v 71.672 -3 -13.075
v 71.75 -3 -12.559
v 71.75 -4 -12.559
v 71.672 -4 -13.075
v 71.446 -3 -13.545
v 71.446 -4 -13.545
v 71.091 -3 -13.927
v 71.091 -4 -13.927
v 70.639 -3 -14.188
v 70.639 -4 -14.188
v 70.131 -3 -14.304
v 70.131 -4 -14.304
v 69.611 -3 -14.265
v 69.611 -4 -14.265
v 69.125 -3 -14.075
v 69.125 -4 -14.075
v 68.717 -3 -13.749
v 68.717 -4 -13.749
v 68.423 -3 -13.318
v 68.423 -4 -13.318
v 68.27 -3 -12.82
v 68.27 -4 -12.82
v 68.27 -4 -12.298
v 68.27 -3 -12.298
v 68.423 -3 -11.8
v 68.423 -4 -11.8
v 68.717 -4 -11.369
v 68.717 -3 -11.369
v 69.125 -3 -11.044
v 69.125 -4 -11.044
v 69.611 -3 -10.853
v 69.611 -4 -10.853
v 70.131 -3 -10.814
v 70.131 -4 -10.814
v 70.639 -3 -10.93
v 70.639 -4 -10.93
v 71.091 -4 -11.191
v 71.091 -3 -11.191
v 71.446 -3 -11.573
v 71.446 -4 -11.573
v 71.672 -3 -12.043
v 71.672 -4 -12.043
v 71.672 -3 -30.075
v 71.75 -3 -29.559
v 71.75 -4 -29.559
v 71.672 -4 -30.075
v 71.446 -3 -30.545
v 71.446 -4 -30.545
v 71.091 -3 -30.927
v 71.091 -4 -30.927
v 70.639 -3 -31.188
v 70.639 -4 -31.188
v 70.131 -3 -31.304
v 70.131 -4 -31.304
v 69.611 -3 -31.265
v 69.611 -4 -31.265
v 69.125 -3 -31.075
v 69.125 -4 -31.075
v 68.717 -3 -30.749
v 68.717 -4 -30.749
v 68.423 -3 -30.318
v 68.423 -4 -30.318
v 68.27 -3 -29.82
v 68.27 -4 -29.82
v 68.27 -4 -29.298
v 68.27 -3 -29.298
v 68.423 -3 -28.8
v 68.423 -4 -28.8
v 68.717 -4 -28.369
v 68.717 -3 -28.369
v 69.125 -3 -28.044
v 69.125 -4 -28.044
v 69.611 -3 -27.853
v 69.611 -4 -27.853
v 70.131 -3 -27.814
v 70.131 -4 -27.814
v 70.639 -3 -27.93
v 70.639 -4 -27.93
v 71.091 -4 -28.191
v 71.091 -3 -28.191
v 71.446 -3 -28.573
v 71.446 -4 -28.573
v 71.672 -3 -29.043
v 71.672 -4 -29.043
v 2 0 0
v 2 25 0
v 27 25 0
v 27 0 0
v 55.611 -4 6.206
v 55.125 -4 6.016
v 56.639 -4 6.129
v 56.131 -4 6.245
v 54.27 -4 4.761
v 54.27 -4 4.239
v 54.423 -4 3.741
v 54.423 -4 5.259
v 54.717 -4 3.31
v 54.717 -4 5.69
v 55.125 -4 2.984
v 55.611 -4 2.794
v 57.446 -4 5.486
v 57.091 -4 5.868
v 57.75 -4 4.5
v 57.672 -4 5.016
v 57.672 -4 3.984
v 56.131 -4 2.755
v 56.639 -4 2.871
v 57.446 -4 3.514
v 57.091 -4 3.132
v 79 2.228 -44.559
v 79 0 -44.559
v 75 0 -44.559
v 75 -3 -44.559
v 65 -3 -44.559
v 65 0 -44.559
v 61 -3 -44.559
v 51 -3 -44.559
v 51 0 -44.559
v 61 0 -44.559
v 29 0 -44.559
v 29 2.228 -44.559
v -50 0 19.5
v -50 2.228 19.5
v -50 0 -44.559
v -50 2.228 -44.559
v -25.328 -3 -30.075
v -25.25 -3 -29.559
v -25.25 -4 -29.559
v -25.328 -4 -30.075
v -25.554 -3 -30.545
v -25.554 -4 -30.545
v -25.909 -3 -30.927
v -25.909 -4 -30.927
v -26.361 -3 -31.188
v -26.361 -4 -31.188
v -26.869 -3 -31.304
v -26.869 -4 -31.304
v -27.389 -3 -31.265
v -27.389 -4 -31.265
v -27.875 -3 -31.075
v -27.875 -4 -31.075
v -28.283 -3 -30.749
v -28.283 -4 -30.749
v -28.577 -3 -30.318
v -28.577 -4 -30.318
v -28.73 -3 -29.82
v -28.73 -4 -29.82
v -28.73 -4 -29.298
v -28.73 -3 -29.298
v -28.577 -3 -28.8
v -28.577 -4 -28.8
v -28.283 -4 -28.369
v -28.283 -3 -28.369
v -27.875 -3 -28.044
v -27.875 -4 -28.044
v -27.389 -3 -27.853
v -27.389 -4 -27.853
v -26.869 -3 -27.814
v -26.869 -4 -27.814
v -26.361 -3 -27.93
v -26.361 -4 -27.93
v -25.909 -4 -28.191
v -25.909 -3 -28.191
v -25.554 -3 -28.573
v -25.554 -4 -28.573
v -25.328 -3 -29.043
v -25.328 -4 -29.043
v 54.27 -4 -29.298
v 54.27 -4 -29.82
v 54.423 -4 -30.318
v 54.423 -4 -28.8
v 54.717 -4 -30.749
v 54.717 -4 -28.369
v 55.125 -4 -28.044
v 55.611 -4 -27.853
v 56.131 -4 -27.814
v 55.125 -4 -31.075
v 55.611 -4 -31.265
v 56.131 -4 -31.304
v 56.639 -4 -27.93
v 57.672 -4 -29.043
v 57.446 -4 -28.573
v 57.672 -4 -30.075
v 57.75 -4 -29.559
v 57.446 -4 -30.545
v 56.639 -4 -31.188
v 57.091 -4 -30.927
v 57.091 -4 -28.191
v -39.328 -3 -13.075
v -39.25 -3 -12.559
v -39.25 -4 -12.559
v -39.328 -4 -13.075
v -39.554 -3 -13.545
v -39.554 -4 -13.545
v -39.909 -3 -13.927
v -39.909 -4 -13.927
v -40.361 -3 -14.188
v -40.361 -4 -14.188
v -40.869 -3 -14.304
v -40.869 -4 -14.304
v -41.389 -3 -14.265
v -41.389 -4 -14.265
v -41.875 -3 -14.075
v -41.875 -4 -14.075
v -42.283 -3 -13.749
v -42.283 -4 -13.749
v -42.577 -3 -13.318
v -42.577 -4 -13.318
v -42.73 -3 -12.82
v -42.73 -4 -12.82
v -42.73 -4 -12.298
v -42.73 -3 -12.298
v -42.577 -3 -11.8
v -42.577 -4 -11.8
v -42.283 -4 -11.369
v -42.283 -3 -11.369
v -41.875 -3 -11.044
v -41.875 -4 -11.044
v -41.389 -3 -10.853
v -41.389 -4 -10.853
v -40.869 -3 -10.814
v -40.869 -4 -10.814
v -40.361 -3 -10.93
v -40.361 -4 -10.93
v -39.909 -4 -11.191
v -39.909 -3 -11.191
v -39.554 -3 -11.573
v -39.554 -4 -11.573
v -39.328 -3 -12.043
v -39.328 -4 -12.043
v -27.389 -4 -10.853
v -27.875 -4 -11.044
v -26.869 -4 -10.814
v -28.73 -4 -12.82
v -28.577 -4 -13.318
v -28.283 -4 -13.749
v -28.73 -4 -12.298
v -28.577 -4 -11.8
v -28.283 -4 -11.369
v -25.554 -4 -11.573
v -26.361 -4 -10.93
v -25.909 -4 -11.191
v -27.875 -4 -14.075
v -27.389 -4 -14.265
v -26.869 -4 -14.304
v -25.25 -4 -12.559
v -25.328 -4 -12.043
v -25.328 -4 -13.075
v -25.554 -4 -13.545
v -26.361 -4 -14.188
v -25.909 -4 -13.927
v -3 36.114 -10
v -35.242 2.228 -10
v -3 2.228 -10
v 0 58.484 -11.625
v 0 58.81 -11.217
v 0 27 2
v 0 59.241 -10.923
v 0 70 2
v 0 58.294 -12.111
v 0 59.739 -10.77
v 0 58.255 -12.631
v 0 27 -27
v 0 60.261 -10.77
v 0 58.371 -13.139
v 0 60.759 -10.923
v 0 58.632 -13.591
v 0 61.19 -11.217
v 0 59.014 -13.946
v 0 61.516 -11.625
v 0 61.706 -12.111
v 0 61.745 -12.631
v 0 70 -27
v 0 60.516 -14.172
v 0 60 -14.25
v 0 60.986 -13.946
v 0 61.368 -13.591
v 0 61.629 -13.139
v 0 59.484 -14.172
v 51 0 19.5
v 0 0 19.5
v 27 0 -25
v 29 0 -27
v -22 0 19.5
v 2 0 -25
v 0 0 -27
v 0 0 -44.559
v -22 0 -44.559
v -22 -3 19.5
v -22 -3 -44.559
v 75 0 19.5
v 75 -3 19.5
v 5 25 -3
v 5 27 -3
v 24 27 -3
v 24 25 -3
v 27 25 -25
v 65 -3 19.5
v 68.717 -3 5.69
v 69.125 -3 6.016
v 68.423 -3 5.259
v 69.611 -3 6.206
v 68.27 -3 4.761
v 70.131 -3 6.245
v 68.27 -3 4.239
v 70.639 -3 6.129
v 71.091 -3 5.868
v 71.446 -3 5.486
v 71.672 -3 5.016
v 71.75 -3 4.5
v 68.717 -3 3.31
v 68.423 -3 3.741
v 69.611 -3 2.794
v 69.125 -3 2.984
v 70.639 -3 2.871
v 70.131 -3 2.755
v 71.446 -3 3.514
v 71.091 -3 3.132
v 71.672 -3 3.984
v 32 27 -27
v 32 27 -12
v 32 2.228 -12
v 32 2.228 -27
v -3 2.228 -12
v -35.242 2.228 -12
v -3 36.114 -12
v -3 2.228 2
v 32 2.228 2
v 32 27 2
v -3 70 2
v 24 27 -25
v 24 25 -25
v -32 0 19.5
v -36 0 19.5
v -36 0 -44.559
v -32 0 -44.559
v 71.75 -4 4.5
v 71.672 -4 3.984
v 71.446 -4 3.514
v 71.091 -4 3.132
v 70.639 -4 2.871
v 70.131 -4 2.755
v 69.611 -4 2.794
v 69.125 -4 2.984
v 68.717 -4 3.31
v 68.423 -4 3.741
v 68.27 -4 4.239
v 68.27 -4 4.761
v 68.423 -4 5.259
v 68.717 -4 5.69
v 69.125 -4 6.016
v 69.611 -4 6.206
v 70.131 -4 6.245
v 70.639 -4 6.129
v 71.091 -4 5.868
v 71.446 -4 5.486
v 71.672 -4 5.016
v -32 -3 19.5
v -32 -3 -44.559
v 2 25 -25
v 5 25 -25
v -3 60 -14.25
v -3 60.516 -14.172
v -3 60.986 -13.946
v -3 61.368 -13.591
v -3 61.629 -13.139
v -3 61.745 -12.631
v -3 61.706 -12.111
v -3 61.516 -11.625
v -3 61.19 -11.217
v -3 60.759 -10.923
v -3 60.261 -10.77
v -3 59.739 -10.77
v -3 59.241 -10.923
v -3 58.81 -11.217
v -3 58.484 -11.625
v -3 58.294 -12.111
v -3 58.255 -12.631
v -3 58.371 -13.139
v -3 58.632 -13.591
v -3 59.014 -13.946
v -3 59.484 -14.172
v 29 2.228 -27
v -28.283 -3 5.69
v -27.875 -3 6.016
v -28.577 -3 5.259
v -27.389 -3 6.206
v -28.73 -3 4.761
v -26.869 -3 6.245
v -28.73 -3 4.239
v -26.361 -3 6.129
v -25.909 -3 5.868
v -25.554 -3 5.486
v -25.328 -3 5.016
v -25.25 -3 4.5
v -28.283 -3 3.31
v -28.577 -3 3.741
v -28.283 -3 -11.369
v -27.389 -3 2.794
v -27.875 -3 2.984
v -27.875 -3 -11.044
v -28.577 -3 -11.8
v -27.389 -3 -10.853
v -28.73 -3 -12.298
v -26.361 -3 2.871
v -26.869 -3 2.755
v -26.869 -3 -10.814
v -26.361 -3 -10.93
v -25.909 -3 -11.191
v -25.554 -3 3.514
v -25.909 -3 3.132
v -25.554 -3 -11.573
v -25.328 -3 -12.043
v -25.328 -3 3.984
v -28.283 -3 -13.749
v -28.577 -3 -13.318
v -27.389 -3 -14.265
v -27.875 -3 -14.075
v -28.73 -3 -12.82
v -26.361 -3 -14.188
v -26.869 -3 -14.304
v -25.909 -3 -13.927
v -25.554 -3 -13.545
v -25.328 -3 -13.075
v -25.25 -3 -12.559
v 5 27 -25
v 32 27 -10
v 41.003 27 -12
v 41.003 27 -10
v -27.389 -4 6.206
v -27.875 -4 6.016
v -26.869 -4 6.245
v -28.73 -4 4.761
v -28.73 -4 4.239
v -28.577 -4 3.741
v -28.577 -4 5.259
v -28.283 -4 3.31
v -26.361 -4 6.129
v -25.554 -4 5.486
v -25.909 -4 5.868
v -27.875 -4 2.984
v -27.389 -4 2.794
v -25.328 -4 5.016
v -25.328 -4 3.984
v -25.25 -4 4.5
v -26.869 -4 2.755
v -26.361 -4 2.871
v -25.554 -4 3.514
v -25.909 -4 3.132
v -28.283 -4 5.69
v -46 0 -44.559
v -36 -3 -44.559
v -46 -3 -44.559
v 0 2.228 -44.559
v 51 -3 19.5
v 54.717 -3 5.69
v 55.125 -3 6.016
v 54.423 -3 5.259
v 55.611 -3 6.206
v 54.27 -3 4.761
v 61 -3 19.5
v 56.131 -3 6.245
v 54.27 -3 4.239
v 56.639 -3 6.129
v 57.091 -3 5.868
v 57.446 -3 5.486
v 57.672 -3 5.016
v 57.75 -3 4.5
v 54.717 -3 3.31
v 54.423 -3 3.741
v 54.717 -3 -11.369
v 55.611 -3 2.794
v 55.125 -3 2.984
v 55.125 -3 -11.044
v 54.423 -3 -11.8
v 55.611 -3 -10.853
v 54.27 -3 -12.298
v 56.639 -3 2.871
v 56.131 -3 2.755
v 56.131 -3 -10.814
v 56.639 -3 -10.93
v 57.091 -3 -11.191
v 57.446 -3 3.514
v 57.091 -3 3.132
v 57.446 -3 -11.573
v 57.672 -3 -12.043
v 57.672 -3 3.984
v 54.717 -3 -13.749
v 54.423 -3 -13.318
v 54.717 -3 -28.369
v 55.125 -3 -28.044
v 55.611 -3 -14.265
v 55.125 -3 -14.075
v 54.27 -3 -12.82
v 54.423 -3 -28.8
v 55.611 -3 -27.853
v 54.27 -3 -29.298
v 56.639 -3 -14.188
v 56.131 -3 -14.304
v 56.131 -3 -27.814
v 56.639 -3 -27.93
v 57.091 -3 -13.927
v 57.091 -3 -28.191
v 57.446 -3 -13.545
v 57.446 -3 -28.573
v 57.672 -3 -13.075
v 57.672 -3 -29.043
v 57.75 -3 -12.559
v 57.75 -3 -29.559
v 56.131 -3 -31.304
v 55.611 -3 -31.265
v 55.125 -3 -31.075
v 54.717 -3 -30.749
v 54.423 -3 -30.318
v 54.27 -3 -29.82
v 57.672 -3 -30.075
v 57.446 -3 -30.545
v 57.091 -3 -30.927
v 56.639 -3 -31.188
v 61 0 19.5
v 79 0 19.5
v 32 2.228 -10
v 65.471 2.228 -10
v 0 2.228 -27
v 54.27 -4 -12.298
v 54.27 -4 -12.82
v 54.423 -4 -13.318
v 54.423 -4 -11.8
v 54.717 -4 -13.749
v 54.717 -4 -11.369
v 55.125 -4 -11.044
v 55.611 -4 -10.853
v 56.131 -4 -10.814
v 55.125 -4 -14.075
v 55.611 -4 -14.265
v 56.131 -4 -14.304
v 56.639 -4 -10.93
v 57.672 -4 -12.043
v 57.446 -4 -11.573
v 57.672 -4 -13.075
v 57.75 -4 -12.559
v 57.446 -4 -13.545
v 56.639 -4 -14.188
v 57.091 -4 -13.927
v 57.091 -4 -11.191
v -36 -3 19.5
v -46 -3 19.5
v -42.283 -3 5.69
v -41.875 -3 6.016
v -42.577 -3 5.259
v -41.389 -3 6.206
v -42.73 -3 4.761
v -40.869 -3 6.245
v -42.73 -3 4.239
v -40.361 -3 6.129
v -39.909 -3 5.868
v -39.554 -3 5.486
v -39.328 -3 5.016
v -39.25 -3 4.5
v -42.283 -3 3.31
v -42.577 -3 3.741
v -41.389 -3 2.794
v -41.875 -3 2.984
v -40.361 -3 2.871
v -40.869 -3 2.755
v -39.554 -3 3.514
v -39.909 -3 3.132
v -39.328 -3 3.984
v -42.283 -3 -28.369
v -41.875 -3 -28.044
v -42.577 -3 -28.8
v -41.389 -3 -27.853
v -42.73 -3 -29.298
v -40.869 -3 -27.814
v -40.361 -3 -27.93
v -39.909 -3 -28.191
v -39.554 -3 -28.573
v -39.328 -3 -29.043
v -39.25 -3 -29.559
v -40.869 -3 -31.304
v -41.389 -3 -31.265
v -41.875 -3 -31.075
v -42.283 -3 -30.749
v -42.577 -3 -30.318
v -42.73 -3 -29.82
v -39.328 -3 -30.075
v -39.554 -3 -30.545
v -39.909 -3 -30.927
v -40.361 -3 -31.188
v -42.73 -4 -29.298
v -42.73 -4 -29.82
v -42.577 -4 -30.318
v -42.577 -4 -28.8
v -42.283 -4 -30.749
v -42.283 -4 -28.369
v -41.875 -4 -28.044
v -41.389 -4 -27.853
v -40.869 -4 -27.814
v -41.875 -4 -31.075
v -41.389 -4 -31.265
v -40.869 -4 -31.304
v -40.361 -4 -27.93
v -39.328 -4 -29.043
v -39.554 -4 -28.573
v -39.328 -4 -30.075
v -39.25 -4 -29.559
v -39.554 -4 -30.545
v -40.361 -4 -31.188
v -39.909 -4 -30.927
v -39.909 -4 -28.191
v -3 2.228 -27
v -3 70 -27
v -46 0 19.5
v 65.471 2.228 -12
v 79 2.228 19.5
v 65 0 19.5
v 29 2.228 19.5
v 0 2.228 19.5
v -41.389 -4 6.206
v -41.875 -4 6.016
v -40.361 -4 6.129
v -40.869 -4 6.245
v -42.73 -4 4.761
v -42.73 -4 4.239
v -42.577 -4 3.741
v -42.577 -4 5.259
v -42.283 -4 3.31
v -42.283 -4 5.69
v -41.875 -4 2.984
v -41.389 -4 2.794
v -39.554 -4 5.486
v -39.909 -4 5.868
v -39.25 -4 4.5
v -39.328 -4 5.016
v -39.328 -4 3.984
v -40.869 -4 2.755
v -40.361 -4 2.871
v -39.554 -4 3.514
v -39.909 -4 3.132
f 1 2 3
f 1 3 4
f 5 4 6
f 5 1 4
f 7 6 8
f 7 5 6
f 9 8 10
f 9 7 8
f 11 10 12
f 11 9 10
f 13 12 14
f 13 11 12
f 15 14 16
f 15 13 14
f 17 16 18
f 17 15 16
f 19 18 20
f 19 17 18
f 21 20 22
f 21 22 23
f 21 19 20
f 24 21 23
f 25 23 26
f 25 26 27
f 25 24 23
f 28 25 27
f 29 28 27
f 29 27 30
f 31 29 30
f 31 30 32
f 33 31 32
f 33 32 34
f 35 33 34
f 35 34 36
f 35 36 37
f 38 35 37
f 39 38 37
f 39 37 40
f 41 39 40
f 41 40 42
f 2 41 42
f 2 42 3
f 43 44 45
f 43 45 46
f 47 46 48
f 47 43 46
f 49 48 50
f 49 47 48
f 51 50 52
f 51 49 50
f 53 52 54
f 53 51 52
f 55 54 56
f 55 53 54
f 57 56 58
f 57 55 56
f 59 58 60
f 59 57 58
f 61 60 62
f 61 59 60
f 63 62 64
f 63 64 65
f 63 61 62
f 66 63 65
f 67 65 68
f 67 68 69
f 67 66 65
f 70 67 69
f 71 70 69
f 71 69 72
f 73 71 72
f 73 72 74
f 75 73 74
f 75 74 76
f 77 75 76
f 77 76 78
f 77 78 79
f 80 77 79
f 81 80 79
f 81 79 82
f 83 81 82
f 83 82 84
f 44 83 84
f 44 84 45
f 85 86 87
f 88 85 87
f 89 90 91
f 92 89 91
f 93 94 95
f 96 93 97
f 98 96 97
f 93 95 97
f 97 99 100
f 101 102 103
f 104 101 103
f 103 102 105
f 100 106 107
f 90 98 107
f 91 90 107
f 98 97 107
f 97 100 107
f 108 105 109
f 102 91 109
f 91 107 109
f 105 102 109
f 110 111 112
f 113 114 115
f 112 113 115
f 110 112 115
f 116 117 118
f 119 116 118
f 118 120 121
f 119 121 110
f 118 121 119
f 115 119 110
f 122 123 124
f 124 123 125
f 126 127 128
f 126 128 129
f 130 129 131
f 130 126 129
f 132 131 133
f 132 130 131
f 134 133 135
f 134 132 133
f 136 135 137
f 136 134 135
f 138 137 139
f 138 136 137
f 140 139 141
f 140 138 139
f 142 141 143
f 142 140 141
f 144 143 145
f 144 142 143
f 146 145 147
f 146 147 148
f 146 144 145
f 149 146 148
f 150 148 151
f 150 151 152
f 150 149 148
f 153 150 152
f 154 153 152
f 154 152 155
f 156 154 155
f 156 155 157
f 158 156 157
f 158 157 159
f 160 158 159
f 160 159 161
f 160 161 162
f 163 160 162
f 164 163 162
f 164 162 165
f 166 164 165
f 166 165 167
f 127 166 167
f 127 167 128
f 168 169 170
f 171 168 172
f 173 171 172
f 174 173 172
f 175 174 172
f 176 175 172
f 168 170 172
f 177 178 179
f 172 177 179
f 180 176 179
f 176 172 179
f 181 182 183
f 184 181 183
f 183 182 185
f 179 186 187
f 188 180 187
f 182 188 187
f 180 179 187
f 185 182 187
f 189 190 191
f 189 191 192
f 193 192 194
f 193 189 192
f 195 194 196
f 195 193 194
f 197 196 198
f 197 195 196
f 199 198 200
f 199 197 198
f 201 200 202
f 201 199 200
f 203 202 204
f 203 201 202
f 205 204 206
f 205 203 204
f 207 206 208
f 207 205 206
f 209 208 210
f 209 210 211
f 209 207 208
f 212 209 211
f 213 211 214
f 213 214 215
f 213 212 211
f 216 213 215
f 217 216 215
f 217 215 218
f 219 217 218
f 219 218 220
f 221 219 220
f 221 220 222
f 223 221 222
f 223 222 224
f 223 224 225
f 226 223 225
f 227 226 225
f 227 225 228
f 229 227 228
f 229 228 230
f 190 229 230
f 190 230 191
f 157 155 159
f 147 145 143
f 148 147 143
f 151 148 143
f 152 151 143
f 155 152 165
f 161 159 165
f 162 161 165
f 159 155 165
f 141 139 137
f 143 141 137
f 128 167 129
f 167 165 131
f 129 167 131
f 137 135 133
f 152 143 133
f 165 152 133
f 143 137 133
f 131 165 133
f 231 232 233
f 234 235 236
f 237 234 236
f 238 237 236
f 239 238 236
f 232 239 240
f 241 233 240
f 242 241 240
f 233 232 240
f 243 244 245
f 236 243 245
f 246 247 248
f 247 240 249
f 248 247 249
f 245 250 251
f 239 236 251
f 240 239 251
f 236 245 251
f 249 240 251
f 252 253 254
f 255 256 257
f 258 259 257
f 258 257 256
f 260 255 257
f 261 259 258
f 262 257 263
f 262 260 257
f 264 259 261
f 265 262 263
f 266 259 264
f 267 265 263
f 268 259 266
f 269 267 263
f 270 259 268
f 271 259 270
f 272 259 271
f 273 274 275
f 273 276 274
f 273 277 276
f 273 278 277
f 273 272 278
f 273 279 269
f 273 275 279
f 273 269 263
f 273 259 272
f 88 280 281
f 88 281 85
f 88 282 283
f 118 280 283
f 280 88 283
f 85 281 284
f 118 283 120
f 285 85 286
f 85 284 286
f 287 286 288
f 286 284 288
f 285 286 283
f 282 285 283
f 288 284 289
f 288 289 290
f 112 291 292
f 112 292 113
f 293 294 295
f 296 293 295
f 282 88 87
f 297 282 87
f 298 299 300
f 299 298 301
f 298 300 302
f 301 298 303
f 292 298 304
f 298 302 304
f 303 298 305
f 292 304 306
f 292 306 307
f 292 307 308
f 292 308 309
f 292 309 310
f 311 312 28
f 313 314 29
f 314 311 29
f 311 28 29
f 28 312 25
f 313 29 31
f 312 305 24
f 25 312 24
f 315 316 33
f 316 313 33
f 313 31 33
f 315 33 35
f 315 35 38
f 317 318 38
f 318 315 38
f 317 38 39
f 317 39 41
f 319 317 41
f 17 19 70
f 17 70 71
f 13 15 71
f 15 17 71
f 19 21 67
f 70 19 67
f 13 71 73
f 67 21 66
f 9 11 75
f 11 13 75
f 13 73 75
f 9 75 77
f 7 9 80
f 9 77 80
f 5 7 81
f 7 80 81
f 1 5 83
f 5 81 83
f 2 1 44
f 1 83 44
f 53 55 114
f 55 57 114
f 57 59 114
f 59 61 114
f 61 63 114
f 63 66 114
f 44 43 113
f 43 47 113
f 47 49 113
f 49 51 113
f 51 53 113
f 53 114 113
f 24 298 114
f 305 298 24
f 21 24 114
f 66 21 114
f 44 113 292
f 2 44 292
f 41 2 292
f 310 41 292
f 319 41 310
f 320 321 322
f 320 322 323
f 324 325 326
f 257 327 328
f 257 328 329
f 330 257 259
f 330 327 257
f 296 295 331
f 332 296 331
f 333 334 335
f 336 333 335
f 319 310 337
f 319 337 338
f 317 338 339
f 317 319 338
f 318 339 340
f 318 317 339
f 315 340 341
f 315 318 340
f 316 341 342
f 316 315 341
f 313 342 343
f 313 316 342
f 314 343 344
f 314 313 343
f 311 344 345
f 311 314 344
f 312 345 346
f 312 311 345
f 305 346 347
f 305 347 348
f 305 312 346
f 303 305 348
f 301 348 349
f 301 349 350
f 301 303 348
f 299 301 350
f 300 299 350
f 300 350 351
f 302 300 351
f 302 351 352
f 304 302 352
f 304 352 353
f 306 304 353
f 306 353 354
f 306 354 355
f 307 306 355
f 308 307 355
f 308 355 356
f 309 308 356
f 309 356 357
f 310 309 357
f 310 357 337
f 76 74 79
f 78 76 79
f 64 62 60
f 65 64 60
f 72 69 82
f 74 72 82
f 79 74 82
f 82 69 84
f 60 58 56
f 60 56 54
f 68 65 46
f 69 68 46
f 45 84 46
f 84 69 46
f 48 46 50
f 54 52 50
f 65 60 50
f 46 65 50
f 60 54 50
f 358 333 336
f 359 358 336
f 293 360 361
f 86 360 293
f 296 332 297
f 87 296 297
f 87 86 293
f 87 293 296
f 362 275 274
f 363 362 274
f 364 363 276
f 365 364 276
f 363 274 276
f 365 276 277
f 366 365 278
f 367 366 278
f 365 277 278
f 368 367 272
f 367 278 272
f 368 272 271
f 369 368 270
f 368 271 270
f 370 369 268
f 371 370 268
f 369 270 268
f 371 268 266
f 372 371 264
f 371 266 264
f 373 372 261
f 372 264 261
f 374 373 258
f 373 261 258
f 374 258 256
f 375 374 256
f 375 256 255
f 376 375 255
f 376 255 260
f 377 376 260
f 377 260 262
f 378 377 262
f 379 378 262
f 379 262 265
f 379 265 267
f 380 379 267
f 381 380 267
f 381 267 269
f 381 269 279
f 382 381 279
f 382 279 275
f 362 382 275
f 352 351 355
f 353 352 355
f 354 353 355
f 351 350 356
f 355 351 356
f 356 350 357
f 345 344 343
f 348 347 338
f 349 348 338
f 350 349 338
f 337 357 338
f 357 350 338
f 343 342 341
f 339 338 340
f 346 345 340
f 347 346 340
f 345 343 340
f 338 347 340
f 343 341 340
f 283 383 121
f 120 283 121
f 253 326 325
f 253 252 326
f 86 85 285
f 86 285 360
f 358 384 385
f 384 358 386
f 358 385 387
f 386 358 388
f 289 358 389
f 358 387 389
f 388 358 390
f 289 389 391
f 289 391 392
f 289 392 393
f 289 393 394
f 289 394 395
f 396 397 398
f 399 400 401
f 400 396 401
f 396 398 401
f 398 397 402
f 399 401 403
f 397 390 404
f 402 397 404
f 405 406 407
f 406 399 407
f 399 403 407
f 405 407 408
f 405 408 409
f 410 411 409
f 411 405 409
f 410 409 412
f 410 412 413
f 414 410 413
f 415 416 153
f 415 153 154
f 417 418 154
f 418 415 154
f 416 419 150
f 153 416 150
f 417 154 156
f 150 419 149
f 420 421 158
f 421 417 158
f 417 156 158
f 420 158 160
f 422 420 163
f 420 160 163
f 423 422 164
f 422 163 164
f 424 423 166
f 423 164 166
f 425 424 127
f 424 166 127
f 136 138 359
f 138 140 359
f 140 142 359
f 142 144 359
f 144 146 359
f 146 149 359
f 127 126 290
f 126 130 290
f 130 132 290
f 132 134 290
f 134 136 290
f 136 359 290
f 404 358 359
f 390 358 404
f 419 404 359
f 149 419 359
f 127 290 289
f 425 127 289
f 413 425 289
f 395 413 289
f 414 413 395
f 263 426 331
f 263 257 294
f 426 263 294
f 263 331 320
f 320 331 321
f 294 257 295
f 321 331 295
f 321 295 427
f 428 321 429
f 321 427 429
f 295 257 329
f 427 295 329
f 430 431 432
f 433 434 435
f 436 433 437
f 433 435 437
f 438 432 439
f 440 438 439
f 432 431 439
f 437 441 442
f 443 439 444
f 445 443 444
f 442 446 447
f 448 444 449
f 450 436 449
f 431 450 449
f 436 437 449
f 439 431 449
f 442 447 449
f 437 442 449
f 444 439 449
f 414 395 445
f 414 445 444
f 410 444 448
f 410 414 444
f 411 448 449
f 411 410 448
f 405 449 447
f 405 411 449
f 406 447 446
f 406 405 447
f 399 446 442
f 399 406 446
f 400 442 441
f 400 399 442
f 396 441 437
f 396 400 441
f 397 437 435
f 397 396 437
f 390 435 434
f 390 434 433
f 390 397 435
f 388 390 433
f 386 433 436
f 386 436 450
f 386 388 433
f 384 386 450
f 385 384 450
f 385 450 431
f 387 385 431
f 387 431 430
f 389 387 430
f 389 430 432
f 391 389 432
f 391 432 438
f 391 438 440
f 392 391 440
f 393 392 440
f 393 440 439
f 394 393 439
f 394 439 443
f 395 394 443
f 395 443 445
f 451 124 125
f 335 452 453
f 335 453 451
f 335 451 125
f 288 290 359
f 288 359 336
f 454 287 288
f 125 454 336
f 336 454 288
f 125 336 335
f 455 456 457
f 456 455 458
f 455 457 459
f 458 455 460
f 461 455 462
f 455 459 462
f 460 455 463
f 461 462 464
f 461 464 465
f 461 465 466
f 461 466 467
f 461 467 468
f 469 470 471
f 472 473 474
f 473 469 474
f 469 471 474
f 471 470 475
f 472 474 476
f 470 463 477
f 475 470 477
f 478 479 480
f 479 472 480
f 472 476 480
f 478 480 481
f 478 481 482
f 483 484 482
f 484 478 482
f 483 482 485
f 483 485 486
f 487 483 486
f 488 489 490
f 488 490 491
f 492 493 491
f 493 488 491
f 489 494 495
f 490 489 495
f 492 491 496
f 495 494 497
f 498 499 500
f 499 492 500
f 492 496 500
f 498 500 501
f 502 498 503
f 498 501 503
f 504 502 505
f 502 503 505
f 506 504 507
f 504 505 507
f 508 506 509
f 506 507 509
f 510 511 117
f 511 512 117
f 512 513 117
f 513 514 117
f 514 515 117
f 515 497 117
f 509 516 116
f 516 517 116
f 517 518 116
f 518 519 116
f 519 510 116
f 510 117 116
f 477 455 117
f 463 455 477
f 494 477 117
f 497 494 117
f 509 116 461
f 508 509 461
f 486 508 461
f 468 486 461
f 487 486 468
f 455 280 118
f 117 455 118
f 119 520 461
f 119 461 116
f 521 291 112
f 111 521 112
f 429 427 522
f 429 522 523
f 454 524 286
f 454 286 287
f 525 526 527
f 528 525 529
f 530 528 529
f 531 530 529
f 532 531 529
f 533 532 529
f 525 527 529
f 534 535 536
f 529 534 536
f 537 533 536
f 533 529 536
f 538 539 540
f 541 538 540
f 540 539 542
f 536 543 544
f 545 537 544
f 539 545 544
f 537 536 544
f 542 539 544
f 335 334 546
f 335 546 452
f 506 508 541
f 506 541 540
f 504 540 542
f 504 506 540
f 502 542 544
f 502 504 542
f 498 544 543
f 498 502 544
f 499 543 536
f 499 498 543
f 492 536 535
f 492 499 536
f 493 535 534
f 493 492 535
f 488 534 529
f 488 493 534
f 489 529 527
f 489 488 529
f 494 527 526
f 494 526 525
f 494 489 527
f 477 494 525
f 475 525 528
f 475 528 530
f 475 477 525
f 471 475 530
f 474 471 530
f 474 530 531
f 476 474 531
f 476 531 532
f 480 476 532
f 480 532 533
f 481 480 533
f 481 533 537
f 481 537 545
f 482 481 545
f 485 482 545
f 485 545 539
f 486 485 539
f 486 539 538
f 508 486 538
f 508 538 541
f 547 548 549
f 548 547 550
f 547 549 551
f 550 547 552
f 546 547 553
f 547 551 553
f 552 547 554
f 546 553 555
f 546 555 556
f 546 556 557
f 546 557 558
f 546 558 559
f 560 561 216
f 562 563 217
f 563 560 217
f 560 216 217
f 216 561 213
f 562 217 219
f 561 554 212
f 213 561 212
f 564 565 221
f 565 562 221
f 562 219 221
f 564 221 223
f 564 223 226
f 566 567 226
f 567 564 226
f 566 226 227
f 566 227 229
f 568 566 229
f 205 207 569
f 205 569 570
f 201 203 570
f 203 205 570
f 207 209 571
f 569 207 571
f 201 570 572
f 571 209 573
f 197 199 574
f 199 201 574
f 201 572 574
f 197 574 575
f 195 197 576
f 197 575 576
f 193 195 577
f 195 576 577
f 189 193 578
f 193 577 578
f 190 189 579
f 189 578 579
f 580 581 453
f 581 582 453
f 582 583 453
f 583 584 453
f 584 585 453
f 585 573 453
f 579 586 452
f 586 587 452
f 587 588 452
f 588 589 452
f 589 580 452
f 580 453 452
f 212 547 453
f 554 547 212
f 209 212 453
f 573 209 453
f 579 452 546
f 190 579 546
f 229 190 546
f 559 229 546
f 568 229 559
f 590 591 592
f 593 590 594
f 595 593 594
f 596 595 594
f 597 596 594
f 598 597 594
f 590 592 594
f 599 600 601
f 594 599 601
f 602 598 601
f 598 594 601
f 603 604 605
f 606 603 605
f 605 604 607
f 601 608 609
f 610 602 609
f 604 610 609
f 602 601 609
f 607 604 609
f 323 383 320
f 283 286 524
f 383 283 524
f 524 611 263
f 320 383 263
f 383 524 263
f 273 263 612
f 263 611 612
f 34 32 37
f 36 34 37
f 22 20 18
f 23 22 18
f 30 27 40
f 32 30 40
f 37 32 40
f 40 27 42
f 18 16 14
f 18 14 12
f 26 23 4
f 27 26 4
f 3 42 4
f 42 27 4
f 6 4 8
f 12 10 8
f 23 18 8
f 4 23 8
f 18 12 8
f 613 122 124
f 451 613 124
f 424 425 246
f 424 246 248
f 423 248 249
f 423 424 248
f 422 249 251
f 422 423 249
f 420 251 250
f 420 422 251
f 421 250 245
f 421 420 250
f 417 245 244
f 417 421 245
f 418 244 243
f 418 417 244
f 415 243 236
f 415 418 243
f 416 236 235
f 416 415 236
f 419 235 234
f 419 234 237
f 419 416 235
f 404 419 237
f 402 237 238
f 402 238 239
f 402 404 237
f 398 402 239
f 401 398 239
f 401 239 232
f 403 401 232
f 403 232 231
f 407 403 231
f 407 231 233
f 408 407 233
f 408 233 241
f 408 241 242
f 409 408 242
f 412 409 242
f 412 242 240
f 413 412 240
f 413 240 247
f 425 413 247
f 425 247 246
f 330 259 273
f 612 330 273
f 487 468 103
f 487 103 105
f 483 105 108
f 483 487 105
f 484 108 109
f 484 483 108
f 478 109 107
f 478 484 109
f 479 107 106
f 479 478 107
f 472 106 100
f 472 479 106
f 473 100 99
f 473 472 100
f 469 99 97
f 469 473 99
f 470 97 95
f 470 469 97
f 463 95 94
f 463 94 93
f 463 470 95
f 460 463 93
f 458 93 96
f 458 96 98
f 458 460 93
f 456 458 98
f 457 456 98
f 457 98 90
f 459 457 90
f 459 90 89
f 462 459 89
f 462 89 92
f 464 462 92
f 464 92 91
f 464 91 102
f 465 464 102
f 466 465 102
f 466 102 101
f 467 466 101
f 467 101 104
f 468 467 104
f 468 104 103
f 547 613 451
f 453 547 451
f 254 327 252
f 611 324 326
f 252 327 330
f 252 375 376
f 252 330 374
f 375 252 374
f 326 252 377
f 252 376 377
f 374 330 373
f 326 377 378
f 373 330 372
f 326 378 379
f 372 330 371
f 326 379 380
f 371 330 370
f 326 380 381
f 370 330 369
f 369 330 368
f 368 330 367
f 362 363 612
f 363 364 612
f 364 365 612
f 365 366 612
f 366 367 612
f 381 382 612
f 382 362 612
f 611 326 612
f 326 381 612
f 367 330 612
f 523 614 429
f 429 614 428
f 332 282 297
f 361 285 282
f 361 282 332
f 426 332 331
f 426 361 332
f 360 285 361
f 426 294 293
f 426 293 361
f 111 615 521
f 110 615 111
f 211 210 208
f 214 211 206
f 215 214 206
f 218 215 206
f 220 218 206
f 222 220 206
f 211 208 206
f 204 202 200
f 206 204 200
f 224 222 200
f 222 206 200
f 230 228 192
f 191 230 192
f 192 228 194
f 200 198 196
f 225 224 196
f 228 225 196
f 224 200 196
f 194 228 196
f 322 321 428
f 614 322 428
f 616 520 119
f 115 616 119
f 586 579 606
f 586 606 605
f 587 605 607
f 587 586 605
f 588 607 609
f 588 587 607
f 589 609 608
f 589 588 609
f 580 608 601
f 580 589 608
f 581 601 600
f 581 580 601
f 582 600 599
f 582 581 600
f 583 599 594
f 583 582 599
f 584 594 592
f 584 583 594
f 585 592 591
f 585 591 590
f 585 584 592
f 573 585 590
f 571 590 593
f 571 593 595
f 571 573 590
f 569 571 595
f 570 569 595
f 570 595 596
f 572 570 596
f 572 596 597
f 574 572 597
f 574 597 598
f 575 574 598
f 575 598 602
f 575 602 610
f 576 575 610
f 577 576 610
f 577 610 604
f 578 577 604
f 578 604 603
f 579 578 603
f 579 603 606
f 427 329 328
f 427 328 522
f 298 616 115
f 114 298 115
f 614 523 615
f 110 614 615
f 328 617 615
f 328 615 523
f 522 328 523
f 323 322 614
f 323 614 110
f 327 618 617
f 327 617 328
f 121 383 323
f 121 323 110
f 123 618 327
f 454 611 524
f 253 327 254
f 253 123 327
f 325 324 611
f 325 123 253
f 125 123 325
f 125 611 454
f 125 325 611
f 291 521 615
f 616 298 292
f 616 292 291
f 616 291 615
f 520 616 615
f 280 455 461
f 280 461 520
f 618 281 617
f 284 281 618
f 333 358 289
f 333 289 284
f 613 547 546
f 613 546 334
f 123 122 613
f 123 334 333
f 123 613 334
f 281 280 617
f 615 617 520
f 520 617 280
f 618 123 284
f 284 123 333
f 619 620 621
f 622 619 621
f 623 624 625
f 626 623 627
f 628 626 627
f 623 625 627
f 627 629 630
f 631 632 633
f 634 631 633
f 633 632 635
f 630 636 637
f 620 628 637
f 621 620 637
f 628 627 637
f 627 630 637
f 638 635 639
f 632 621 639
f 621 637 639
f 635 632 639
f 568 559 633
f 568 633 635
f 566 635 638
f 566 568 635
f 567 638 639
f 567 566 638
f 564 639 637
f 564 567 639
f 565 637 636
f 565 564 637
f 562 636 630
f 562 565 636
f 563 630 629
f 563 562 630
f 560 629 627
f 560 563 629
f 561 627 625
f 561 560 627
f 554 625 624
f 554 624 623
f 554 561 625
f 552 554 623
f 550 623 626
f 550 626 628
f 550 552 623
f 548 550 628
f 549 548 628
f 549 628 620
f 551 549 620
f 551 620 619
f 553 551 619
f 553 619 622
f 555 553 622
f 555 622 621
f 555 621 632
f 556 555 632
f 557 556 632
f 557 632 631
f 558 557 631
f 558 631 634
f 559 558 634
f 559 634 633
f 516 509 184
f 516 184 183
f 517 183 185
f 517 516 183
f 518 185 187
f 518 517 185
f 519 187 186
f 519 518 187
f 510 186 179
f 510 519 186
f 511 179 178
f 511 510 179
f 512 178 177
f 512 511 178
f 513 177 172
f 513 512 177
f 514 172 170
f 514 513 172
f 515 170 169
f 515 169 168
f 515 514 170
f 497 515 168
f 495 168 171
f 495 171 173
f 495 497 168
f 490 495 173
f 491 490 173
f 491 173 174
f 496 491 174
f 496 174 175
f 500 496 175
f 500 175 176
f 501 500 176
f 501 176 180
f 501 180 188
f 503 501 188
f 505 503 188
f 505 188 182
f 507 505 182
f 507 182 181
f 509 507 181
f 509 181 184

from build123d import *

# Parameters (mm, degrees)
SKETCH1_W                 = 29
SKETCH1_H                 = 27
BOSS_EXTRUDE2_DEPTH       = 2
SKETCH2_W                 = 2
SKETCH2_H                 = 27
BOSS_EXTRUDE3_DEPTH       = 27
SKETCH3_W                 = 2
SKETCH3_H                 = 27
BOSS_EXTRUDE4_DEPTH       = 27
SKETCH4_W                 = 2
SKETCH4_H                 = 27
BOSS_EXTRUDE5_DEPTH       = 29
SKETCH5_W                 = 29
SKETCH5_H                 = 2
BOSS_EXTRUDE6_DEPTH       = 5
SKETCH6_W                 = 29
SKETCH6_H                 = 2
BOSS_EXTRUDE7_DEPTH       = 5
SKETCH7_W                 = 29
SKETCH7_H                 = 2
BOSS_EXTRUDE9_DEPTH       = 3
SKETCH8_W                 = 29
SKETCH8_H                 = 70
BOSS_EXTRUDE10_DEPTH      = 3
SKETCH9_W                 = 29
SKETCH9_H                 = 70
BOSS_EXTRUDE11_DEPTH      = 3
SKETCH10_R                = 1.75
CUT_EXTRUDE1_DEPTH        = 40
CUT_EXTRUDE1_DEPTH_BACK   = 4
SKETCH14_W                = 64.059186105
SKETCH14_H                = 2.228166541
BOSS_EXTRUDE15_DEPTH      = 50
SKETCH15_W                = 64.059186105
SKETCH15_H                = 2.228166541
BOSS_EXTRUDE16_DEPTH      = 50
SKETCH16_W                = 17.5
SKETCH16_H                = 2.228166541
BOSS_EXTRUDE17_DEPTH      = 29
BOSS_EXTRUDE18_DEPTH      = 1
BOSS_EXTRUDE18_DEPTH_BACK = 1
SKETCH19_W                = 29
SKETCH19_H                = 43
CUT_EXTRUDE2_DEPTH        = 15
SKETCH20_W                = 10
SKETCH20_H                = 64.059186105
BOSS_EXTRUDE19_DEPTH      = 3
SKETCH21_R                = 1.75
BOSS_EXTRUDE20_DEPTH      = 4


with BuildPart() as part:
    # Sketch1 → Boss-Extrude2 (new body)
    with BuildSketch(Plane.XY):
        with Locations((14.5, 13.5)):
            Rectangle(SKETCH1_W, SKETCH1_H)
    extrude(amount=BOSS_EXTRUDE2_DEPTH)

    # Sketch2 → Boss-Extrude3 (add)
    with BuildSketch(Plane.XY):
        with Locations((1, 13.5)):
            Rectangle(SKETCH2_W, SKETCH2_H)
    extrude(amount=-BOSS_EXTRUDE3_DEPTH)

    # Sketch3 → Boss-Extrude4 (add)
    with BuildSketch(Plane.XY):
        with Locations((28, 13.5)):
            Rectangle(SKETCH3_W, SKETCH3_H)
    extrude(amount=-BOSS_EXTRUDE4_DEPTH)

    # Sketch4 → Boss-Extrude5 (add)
    with BuildSketch(Plane(origin=(0, 0, 0), x_dir=(0, 0, -1), z_dir=(1, 0, 0))):
        with Locations((26, 13.5)):
            Rectangle(SKETCH4_W, SKETCH4_H)
    extrude(amount=BOSS_EXTRUDE5_DEPTH)

    # Sketch5 → Boss-Extrude6 (add)
    with BuildSketch(Plane(origin=(0, 0, 0), x_dir=(0, 0, -1), z_dir=(1, 0, 0))):
        with Locations((12.5, 26)):
            Rectangle(SKETCH5_W, SKETCH5_H)
    extrude(amount=BOSS_EXTRUDE6_DEPTH)

    # Sketch6 → Boss-Extrude7 (add)
    with BuildSketch(Plane(origin=(29, 0, 0), x_dir=(0, 0, -1), z_dir=(1, 0, 0))):
        with Locations((12.5, 26)):
            Rectangle(SKETCH6_W, SKETCH6_H)
    extrude(amount=-BOSS_EXTRUDE7_DEPTH)

    # Sketch7 → Boss-Extrude9 (add)
    with BuildSketch(Plane.XY):
        with Locations((14.5, 26)):
            Rectangle(SKETCH7_W, SKETCH7_H)
    extrude(amount=-BOSS_EXTRUDE9_DEPTH)

    # Sketch8 → Boss-Extrude10 (add)
    with BuildSketch(Plane(origin=(0, 0, 0), x_dir=(0, 0, -1), z_dir=(1, 0, 0))):
        with Locations((12.5, 35)):
            Rectangle(SKETCH8_W, SKETCH8_H)
    extrude(amount=-BOSS_EXTRUDE10_DEPTH)

    # Sketch9 → Boss-Extrude11 (add)
    with BuildSketch(Plane(origin=(29, 0, 0), x_dir=(0, 0, -1), z_dir=(1, 0, 0))):
        with Locations((12.5, 35)):
            Rectangle(SKETCH9_W, SKETCH9_H)
    extrude(amount=BOSS_EXTRUDE11_DEPTH)

    # Sketch10 → Cut-Extrude1 (cut, two sides)
    with BuildSketch(Plane(origin=(0, 0, 0), x_dir=(0, 0, -1), z_dir=(1, 0, 0))) as cut_extrude1_sk:
        with Locations((12.5, 60)):
            Circle(SKETCH10_R)
    extrude(amount=CUT_EXTRUDE1_DEPTH, mode=Mode.SUBTRACT)
    extrude(cut_extrude1_sk.sketch, amount=-CUT_EXTRUDE1_DEPTH_BACK, mode=Mode.SUBTRACT)

    # Sketch14 → Boss-Extrude15 (add)
    with BuildSketch(Plane(origin=(29, 0, 0), x_dir=(0, 0, -1), z_dir=(1, 0, 0))):
        with Locations((12.529593053, 1.114083271)):
            Rectangle(SKETCH14_W, SKETCH14_H)
    extrude(amount=BOSS_EXTRUDE15_DEPTH)

    # Sketch15 → Boss-Extrude16 (add)
    with BuildSketch(Plane(origin=(0, 0, 0), x_dir=(0, 0, -1), z_dir=(1, 0, 0))):
        with Locations((12.529593053, 1.114083271)):
            Rectangle(SKETCH15_W, SKETCH15_H)
    extrude(amount=-BOSS_EXTRUDE16_DEPTH)

    # Sketch16 → Boss-Extrude17 (add)
    with BuildSketch(Plane(origin=(0, 0, 0), x_dir=(0, 0, -1), z_dir=(1, 0, 0))):
        with Locations((-10.75, 1.114083271)):
            Rectangle(SKETCH16_W, SKETCH16_H)
    extrude(amount=BOSS_EXTRUDE17_DEPTH)

    # Sketch18 → Boss-Extrude18 (add, two sides)
    with BuildSketch(Plane.XY.offset(-11)) as boss_extrude18_sk:
        Polygon((-35.241827575, 2.228166541), (-3, 2.228166541), (-3, 36.114083271), align=None)
        Polygon((32, 2.228166541), (65.471342827, 2.228166541), (32, 36.114083271), align=None)
    extrude(amount=BOSS_EXTRUDE18_DEPTH)
    extrude(boss_extrude18_sk.sketch, amount=-BOSS_EXTRUDE18_DEPTH_BACK)

    # Sketch19 → Cut-Extrude2 (cut)
    with BuildSketch(Plane(origin=(29, 0, 0), x_dir=(0, 0, -1), z_dir=(1, 0, 0))):
        with Locations((12.5, 48.5)):
            Rectangle(SKETCH19_W, SKETCH19_H)
    extrude(amount=CUT_EXTRUDE2_DEPTH, mode=Mode.SUBTRACT)

    # Sketch20 → Boss-Extrude19 (add)
    with BuildSketch(Plane(origin=(0, 0, 0), x_dir=(1, 0, 0), z_dir=(0, 1, 0))):
        with Locations((-41, 12.529593053)):
            Rectangle(SKETCH20_W, SKETCH20_H)
        with Locations((-27, 12.529593053)):
            Rectangle(SKETCH20_W, SKETCH20_H)
        with Locations((70, 12.529593053)):
            Rectangle(SKETCH20_W, SKETCH20_H)
        with Locations((56, 12.529593053)):
            Rectangle(SKETCH20_W, SKETCH20_H)
    extrude(amount=-BOSS_EXTRUDE19_DEPTH)

    # Sketch21 → Boss-Extrude20 (add)
    with BuildSketch(Plane(origin=(0, 0, 0), x_dir=(1, 0, 0), z_dir=(0, 1, 0))):
        with Locations((-41, 29.559186105)):
            Circle(SKETCH21_R)
        with Locations((-41, 12.559186105)):
            Circle(SKETCH21_R)
        with Locations((-41, -4.5)):
            Circle(SKETCH21_R)
        with Locations((-27, 29.559186105)):
            Circle(SKETCH21_R)
        with Locations((-27, 12.559186105)):
            Circle(SKETCH21_R)
        with Locations((-27, -4.5)):
            Circle(SKETCH21_R)
        with Locations((56, 29.559186105)):
            Circle(SKETCH21_R)
        with Locations((56, 12.559186105)):
            Circle(SKETCH21_R)
        with Locations((56, -4.5)):
            Circle(SKETCH21_R)
        with Locations((70, 29.559186105)):
            Circle(SKETCH21_R)
        with Locations((70, 12.559186105)):
            Circle(SKETCH21_R)
        with Locations((70, -4.5)):
            Circle(SKETCH21_R)
    extrude(amount=-BOSS_EXTRUDE20_DEPTH)


solid = part.part
